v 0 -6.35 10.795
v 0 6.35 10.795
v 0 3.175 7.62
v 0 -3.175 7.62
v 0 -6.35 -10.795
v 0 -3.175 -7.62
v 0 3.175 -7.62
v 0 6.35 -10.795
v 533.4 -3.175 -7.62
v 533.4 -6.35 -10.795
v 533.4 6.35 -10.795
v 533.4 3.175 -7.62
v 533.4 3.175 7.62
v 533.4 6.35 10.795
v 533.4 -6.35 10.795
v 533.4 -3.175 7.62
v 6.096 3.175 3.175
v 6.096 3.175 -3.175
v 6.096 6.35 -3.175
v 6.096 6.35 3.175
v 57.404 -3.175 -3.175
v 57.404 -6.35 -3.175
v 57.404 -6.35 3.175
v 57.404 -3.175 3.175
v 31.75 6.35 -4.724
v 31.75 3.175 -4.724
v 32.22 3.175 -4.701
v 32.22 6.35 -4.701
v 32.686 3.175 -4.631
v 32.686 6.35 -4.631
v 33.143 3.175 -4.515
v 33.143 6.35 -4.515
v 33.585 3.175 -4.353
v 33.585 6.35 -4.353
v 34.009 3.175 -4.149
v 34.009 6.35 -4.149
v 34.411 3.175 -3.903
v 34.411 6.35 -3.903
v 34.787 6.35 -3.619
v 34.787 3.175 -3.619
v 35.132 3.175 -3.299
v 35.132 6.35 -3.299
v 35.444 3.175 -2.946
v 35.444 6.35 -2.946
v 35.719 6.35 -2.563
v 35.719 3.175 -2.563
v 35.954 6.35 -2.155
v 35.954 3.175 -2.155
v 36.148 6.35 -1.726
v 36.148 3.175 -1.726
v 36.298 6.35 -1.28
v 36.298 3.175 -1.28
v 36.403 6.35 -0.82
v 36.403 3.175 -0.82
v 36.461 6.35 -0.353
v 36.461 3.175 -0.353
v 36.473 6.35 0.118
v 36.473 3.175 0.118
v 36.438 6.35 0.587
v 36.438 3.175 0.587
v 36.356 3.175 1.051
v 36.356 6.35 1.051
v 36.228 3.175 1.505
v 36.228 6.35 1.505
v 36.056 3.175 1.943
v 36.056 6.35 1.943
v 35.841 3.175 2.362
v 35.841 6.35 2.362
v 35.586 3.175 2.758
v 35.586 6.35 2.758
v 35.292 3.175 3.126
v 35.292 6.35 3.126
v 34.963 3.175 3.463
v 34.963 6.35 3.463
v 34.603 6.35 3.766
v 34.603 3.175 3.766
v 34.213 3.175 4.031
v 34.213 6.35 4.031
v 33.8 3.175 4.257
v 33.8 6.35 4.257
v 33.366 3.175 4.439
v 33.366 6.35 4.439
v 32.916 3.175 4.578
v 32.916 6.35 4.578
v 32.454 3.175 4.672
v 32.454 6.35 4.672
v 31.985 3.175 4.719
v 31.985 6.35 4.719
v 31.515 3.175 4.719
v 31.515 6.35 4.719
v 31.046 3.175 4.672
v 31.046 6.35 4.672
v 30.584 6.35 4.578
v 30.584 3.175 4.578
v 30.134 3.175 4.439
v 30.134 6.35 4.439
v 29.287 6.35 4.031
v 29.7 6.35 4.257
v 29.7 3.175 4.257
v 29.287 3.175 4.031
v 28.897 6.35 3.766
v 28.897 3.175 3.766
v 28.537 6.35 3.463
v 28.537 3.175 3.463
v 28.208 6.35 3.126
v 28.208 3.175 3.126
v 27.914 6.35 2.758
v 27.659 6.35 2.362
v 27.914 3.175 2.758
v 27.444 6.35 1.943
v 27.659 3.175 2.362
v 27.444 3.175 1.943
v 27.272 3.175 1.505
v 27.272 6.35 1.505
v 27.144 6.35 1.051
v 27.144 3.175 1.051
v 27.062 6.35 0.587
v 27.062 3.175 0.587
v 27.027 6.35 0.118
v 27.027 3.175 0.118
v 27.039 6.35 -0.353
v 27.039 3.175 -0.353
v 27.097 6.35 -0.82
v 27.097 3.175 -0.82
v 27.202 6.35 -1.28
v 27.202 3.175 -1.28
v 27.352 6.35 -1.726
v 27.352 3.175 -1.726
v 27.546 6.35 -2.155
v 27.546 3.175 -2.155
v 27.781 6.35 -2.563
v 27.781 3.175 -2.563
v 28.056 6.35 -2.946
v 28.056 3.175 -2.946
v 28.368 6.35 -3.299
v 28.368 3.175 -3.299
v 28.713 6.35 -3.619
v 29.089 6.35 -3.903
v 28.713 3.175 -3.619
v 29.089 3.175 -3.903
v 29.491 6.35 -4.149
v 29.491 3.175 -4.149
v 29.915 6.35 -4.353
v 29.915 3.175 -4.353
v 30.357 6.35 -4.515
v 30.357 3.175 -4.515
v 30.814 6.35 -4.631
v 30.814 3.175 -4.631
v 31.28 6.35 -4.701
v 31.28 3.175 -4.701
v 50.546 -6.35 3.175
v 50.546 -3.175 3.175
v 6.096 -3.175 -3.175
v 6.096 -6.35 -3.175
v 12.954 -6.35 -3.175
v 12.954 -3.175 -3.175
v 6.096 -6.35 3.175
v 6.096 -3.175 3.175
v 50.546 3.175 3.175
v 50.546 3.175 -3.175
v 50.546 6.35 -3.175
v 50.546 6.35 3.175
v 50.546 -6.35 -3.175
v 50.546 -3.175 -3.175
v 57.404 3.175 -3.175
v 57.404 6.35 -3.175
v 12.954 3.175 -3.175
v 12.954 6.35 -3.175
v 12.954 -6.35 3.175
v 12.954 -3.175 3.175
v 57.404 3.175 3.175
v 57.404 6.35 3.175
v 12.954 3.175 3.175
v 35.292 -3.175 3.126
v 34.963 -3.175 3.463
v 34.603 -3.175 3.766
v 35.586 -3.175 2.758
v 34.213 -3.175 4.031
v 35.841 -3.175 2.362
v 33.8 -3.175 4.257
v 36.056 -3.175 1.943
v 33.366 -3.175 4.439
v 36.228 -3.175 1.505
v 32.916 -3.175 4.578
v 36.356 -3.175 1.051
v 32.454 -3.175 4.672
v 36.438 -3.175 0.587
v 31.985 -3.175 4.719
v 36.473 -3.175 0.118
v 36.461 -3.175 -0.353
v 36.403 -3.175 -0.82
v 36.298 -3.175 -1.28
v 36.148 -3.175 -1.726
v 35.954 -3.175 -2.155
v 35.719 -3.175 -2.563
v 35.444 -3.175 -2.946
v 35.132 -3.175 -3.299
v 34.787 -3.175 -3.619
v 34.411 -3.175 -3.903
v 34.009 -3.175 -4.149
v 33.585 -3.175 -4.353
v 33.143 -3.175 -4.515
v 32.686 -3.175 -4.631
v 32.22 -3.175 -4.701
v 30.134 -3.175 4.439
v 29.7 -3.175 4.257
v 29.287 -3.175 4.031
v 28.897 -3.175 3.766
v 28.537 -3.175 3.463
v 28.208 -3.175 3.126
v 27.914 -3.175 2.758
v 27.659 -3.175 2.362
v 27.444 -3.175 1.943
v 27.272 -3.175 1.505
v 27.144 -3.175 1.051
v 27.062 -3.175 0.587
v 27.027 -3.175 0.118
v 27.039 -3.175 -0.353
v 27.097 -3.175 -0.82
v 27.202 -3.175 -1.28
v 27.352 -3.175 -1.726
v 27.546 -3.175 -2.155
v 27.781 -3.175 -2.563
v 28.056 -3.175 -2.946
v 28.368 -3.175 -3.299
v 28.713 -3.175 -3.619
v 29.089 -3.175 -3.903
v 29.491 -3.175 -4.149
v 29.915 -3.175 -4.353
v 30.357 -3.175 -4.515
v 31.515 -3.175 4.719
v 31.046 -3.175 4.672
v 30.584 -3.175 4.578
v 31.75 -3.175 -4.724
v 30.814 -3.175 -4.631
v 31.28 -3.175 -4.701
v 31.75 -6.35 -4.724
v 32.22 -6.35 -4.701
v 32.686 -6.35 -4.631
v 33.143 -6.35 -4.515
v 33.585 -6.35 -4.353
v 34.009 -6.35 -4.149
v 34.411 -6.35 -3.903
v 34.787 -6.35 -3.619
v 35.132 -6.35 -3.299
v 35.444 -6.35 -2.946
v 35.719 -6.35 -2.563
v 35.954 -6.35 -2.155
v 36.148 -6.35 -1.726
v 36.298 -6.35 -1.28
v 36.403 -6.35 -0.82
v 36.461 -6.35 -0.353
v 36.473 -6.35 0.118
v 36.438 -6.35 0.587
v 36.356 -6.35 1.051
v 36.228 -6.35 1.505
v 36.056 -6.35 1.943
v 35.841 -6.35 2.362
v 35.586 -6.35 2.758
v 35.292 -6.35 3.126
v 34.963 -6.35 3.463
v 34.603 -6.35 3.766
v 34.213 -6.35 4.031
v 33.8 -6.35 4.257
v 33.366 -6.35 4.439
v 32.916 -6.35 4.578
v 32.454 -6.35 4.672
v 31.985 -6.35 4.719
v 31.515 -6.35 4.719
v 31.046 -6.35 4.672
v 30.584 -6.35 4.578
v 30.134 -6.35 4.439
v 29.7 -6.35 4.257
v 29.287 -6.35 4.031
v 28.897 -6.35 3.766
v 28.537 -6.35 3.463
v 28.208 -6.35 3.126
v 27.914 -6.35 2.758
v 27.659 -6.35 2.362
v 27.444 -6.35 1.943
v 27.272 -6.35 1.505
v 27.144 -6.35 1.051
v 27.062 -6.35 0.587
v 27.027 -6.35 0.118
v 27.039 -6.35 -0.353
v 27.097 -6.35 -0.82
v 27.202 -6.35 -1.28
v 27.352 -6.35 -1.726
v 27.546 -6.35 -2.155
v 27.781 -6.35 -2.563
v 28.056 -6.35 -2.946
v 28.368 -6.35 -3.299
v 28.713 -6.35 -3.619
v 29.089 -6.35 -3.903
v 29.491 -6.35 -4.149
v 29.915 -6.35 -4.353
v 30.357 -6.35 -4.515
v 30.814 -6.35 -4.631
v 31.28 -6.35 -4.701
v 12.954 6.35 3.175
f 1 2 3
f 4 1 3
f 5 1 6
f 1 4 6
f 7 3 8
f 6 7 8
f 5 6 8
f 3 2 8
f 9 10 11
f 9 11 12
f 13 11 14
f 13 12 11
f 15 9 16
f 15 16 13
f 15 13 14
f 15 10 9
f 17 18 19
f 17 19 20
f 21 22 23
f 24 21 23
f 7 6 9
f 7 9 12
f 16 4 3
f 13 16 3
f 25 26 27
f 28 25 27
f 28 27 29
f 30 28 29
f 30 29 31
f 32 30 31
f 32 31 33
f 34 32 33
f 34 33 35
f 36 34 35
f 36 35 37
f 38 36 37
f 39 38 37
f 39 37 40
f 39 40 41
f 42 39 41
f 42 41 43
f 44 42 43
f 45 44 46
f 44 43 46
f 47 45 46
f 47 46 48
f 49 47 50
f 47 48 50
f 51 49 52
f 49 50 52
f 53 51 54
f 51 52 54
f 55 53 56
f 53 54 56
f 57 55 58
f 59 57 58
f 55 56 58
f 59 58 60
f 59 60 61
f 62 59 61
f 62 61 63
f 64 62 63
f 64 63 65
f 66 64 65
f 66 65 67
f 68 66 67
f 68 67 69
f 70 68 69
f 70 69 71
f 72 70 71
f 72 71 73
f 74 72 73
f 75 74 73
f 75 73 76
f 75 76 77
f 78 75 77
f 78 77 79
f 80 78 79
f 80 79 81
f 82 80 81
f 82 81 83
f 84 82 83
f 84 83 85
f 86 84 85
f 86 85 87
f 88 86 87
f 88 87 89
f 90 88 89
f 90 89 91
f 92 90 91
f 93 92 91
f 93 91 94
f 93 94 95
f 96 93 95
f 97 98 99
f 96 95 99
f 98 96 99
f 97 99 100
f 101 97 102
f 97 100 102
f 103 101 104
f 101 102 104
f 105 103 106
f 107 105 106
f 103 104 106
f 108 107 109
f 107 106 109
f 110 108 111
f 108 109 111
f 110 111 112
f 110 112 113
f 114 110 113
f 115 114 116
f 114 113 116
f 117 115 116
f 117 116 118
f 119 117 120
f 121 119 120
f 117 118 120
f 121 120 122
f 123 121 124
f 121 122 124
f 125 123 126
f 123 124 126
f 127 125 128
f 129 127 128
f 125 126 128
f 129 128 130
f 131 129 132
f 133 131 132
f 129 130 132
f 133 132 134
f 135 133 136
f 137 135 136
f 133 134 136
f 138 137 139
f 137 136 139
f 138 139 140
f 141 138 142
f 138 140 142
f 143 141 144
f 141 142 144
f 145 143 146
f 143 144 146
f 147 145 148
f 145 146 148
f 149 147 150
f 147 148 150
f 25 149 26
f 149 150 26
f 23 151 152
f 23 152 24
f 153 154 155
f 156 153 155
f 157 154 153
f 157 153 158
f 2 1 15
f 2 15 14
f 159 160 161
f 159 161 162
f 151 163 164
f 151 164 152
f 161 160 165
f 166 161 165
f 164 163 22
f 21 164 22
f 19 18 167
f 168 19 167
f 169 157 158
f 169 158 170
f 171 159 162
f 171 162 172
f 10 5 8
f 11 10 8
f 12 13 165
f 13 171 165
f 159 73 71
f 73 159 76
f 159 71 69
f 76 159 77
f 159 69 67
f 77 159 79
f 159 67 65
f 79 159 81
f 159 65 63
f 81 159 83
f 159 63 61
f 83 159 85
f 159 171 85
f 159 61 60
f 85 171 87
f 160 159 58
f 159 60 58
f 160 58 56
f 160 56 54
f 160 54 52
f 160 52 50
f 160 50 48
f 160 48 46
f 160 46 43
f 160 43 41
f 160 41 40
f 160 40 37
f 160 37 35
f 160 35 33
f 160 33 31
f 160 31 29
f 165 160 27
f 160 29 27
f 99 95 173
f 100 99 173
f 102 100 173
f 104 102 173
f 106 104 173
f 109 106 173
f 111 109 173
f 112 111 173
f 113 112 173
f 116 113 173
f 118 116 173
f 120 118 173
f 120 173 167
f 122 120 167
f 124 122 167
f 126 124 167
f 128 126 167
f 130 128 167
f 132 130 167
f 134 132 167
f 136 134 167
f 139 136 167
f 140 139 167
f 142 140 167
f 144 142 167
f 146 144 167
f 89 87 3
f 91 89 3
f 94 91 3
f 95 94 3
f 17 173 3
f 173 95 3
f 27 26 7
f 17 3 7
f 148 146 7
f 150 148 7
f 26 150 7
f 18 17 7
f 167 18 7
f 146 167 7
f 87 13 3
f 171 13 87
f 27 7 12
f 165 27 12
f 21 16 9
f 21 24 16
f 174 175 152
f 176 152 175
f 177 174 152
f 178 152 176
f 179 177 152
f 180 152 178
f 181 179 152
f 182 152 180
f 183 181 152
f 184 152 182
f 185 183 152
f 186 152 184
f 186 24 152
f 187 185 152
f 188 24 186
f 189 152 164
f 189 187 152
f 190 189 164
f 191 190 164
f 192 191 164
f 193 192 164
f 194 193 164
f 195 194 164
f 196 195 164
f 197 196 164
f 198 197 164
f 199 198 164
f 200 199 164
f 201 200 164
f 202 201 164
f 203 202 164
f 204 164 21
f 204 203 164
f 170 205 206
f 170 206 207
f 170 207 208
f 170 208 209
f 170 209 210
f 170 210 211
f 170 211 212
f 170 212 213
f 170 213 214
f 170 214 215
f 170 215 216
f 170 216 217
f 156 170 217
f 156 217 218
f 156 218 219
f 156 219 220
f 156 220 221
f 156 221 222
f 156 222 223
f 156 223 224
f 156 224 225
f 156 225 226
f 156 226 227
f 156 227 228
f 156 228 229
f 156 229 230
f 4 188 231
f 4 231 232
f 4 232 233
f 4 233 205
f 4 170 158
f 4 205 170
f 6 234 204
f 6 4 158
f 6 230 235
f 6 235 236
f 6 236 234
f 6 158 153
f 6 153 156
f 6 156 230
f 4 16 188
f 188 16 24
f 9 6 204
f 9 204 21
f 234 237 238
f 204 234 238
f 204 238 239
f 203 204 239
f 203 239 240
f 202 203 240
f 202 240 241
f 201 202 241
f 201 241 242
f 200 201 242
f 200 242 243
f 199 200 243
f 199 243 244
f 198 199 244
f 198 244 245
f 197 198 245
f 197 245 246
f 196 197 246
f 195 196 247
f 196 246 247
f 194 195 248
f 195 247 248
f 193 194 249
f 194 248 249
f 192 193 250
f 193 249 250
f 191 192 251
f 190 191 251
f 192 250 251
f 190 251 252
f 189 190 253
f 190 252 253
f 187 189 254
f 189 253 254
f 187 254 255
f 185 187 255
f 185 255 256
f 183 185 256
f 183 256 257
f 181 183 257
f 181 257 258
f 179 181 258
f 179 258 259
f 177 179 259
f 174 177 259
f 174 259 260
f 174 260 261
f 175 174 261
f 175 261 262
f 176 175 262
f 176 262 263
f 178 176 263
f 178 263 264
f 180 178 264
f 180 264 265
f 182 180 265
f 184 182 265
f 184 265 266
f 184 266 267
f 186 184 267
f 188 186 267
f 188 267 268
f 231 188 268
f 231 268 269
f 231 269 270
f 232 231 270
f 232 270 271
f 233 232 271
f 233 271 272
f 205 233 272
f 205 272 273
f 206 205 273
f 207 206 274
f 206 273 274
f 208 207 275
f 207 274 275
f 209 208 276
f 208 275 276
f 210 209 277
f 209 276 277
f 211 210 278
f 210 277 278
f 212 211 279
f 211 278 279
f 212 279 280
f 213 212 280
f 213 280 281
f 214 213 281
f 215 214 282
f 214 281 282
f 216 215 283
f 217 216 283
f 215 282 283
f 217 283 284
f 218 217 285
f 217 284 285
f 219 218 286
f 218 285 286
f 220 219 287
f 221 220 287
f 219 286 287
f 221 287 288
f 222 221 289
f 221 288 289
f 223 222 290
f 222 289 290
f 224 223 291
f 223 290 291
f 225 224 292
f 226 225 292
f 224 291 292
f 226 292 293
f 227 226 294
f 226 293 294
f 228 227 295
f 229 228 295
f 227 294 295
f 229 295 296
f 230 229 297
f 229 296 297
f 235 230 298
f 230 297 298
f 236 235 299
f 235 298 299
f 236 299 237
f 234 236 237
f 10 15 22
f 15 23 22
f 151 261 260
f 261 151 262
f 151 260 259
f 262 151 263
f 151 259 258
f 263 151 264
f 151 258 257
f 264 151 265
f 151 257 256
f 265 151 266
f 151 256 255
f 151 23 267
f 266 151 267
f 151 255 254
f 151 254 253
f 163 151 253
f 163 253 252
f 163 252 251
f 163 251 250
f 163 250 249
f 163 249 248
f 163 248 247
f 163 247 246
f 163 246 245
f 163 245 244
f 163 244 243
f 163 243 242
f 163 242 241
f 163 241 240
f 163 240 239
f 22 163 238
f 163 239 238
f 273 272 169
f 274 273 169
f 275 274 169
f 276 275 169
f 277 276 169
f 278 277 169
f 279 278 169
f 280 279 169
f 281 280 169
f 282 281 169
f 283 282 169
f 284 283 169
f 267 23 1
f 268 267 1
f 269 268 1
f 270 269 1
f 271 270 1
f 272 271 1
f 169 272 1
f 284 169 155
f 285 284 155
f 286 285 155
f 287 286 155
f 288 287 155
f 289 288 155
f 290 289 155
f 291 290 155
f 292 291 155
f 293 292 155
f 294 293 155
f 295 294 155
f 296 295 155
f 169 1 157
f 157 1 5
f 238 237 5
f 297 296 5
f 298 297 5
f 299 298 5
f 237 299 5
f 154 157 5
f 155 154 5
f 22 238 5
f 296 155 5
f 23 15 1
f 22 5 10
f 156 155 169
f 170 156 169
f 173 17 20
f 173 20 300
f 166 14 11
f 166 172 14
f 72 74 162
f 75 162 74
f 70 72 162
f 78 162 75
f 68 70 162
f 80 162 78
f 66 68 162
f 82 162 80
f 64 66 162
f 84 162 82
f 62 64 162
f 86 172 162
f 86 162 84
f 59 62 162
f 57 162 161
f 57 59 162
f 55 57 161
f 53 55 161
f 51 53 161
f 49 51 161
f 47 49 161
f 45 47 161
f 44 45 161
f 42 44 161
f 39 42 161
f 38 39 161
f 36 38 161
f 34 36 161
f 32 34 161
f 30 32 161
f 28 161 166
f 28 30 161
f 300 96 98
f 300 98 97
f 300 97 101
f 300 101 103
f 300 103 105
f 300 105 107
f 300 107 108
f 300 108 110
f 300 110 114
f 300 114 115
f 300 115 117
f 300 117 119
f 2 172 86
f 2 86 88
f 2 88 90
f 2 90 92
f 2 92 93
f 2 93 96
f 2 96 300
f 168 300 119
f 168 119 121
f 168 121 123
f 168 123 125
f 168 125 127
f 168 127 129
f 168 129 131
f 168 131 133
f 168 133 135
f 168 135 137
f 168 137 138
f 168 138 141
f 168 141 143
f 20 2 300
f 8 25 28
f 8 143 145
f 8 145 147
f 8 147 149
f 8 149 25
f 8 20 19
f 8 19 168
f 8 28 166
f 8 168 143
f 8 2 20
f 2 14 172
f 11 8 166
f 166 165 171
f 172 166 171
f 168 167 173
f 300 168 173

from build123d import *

# Parameters (mm, degrees)
ESQUISSE1_W             = 21.59
ESQUISSE1_H             = 12.7
ESQUISSE1_W_2           = 15.24
ESQUISSE1_H_2           = 6.35
BOSS_EXTRU_1_DEPTH      = 596.9
ESQUISSE2_R             = 4.7244
ESQUISSE2_W             = 6.858
ESQUISSE2_H             = 6.35
ENL_V_MAT_EXTRU_1_DEPTH = 598.132675396
ESQUISSE3_W             = 63.5
ESQUISSE3_H             = 21.59
ENL_V_MAT_EXTRU_2_DEPTH = 598.132675396


with BuildPart() as part:
    # Esquisse1 → Boss.-Extru.1 (new body)
    with BuildSketch(Plane(origin=(0, 0, 0), x_dir=(0, 0, -1), z_dir=(1, 0, 0))):
        Rectangle(ESQUISSE1_W, ESQUISSE1_H)
        Rectangle(ESQUISSE1_W_2, ESQUISSE1_H_2, mode=Mode.SUBTRACT)
    extrude(amount=BOSS_EXTRU_1_DEPTH)

    # Esquisse2 → Enlèv. mat.-Extru.1 (cut, through all)
    with BuildSketch(Plane.XZ.offset(6.35)):
        with Locations(Location((31.75, 0, 0), (0, 0, 270))):
            Circle(ESQUISSE2_R)
        with Locations((9.525, 0)):
            Rectangle(ESQUISSE2_W, ESQUISSE2_H)
        with Locations((53.975, 0)):
            Rectangle(ESQUISSE2_W, ESQUISSE2_H)
    enl_v_mat_extru_1 = extrude(amount=-ENL_V_MAT_EXTRU_1_DEPTH, mode=Mode.SUBTRACT)

    # Symétrie1: Enlèv. mat.-Extru.1 across plane
    add(enl_v_mat_extru_1.mirror(Plane.ZY.offset(-298.45)), mode=Mode.SUBTRACT)

    # Esquisse3 → Enlèv. mat.-Extru.2 (cut, through all)
    with BuildSketch(Plane.XZ.offset(6.35)):
        with Locations((565.15, 0)):
            Rectangle(ESQUISSE3_W, ESQUISSE3_H)
    extrude(amount=-ENL_V_MAT_EXTRU_2_DEPTH, mode=Mode.SUBTRACT)


solid = part.part
